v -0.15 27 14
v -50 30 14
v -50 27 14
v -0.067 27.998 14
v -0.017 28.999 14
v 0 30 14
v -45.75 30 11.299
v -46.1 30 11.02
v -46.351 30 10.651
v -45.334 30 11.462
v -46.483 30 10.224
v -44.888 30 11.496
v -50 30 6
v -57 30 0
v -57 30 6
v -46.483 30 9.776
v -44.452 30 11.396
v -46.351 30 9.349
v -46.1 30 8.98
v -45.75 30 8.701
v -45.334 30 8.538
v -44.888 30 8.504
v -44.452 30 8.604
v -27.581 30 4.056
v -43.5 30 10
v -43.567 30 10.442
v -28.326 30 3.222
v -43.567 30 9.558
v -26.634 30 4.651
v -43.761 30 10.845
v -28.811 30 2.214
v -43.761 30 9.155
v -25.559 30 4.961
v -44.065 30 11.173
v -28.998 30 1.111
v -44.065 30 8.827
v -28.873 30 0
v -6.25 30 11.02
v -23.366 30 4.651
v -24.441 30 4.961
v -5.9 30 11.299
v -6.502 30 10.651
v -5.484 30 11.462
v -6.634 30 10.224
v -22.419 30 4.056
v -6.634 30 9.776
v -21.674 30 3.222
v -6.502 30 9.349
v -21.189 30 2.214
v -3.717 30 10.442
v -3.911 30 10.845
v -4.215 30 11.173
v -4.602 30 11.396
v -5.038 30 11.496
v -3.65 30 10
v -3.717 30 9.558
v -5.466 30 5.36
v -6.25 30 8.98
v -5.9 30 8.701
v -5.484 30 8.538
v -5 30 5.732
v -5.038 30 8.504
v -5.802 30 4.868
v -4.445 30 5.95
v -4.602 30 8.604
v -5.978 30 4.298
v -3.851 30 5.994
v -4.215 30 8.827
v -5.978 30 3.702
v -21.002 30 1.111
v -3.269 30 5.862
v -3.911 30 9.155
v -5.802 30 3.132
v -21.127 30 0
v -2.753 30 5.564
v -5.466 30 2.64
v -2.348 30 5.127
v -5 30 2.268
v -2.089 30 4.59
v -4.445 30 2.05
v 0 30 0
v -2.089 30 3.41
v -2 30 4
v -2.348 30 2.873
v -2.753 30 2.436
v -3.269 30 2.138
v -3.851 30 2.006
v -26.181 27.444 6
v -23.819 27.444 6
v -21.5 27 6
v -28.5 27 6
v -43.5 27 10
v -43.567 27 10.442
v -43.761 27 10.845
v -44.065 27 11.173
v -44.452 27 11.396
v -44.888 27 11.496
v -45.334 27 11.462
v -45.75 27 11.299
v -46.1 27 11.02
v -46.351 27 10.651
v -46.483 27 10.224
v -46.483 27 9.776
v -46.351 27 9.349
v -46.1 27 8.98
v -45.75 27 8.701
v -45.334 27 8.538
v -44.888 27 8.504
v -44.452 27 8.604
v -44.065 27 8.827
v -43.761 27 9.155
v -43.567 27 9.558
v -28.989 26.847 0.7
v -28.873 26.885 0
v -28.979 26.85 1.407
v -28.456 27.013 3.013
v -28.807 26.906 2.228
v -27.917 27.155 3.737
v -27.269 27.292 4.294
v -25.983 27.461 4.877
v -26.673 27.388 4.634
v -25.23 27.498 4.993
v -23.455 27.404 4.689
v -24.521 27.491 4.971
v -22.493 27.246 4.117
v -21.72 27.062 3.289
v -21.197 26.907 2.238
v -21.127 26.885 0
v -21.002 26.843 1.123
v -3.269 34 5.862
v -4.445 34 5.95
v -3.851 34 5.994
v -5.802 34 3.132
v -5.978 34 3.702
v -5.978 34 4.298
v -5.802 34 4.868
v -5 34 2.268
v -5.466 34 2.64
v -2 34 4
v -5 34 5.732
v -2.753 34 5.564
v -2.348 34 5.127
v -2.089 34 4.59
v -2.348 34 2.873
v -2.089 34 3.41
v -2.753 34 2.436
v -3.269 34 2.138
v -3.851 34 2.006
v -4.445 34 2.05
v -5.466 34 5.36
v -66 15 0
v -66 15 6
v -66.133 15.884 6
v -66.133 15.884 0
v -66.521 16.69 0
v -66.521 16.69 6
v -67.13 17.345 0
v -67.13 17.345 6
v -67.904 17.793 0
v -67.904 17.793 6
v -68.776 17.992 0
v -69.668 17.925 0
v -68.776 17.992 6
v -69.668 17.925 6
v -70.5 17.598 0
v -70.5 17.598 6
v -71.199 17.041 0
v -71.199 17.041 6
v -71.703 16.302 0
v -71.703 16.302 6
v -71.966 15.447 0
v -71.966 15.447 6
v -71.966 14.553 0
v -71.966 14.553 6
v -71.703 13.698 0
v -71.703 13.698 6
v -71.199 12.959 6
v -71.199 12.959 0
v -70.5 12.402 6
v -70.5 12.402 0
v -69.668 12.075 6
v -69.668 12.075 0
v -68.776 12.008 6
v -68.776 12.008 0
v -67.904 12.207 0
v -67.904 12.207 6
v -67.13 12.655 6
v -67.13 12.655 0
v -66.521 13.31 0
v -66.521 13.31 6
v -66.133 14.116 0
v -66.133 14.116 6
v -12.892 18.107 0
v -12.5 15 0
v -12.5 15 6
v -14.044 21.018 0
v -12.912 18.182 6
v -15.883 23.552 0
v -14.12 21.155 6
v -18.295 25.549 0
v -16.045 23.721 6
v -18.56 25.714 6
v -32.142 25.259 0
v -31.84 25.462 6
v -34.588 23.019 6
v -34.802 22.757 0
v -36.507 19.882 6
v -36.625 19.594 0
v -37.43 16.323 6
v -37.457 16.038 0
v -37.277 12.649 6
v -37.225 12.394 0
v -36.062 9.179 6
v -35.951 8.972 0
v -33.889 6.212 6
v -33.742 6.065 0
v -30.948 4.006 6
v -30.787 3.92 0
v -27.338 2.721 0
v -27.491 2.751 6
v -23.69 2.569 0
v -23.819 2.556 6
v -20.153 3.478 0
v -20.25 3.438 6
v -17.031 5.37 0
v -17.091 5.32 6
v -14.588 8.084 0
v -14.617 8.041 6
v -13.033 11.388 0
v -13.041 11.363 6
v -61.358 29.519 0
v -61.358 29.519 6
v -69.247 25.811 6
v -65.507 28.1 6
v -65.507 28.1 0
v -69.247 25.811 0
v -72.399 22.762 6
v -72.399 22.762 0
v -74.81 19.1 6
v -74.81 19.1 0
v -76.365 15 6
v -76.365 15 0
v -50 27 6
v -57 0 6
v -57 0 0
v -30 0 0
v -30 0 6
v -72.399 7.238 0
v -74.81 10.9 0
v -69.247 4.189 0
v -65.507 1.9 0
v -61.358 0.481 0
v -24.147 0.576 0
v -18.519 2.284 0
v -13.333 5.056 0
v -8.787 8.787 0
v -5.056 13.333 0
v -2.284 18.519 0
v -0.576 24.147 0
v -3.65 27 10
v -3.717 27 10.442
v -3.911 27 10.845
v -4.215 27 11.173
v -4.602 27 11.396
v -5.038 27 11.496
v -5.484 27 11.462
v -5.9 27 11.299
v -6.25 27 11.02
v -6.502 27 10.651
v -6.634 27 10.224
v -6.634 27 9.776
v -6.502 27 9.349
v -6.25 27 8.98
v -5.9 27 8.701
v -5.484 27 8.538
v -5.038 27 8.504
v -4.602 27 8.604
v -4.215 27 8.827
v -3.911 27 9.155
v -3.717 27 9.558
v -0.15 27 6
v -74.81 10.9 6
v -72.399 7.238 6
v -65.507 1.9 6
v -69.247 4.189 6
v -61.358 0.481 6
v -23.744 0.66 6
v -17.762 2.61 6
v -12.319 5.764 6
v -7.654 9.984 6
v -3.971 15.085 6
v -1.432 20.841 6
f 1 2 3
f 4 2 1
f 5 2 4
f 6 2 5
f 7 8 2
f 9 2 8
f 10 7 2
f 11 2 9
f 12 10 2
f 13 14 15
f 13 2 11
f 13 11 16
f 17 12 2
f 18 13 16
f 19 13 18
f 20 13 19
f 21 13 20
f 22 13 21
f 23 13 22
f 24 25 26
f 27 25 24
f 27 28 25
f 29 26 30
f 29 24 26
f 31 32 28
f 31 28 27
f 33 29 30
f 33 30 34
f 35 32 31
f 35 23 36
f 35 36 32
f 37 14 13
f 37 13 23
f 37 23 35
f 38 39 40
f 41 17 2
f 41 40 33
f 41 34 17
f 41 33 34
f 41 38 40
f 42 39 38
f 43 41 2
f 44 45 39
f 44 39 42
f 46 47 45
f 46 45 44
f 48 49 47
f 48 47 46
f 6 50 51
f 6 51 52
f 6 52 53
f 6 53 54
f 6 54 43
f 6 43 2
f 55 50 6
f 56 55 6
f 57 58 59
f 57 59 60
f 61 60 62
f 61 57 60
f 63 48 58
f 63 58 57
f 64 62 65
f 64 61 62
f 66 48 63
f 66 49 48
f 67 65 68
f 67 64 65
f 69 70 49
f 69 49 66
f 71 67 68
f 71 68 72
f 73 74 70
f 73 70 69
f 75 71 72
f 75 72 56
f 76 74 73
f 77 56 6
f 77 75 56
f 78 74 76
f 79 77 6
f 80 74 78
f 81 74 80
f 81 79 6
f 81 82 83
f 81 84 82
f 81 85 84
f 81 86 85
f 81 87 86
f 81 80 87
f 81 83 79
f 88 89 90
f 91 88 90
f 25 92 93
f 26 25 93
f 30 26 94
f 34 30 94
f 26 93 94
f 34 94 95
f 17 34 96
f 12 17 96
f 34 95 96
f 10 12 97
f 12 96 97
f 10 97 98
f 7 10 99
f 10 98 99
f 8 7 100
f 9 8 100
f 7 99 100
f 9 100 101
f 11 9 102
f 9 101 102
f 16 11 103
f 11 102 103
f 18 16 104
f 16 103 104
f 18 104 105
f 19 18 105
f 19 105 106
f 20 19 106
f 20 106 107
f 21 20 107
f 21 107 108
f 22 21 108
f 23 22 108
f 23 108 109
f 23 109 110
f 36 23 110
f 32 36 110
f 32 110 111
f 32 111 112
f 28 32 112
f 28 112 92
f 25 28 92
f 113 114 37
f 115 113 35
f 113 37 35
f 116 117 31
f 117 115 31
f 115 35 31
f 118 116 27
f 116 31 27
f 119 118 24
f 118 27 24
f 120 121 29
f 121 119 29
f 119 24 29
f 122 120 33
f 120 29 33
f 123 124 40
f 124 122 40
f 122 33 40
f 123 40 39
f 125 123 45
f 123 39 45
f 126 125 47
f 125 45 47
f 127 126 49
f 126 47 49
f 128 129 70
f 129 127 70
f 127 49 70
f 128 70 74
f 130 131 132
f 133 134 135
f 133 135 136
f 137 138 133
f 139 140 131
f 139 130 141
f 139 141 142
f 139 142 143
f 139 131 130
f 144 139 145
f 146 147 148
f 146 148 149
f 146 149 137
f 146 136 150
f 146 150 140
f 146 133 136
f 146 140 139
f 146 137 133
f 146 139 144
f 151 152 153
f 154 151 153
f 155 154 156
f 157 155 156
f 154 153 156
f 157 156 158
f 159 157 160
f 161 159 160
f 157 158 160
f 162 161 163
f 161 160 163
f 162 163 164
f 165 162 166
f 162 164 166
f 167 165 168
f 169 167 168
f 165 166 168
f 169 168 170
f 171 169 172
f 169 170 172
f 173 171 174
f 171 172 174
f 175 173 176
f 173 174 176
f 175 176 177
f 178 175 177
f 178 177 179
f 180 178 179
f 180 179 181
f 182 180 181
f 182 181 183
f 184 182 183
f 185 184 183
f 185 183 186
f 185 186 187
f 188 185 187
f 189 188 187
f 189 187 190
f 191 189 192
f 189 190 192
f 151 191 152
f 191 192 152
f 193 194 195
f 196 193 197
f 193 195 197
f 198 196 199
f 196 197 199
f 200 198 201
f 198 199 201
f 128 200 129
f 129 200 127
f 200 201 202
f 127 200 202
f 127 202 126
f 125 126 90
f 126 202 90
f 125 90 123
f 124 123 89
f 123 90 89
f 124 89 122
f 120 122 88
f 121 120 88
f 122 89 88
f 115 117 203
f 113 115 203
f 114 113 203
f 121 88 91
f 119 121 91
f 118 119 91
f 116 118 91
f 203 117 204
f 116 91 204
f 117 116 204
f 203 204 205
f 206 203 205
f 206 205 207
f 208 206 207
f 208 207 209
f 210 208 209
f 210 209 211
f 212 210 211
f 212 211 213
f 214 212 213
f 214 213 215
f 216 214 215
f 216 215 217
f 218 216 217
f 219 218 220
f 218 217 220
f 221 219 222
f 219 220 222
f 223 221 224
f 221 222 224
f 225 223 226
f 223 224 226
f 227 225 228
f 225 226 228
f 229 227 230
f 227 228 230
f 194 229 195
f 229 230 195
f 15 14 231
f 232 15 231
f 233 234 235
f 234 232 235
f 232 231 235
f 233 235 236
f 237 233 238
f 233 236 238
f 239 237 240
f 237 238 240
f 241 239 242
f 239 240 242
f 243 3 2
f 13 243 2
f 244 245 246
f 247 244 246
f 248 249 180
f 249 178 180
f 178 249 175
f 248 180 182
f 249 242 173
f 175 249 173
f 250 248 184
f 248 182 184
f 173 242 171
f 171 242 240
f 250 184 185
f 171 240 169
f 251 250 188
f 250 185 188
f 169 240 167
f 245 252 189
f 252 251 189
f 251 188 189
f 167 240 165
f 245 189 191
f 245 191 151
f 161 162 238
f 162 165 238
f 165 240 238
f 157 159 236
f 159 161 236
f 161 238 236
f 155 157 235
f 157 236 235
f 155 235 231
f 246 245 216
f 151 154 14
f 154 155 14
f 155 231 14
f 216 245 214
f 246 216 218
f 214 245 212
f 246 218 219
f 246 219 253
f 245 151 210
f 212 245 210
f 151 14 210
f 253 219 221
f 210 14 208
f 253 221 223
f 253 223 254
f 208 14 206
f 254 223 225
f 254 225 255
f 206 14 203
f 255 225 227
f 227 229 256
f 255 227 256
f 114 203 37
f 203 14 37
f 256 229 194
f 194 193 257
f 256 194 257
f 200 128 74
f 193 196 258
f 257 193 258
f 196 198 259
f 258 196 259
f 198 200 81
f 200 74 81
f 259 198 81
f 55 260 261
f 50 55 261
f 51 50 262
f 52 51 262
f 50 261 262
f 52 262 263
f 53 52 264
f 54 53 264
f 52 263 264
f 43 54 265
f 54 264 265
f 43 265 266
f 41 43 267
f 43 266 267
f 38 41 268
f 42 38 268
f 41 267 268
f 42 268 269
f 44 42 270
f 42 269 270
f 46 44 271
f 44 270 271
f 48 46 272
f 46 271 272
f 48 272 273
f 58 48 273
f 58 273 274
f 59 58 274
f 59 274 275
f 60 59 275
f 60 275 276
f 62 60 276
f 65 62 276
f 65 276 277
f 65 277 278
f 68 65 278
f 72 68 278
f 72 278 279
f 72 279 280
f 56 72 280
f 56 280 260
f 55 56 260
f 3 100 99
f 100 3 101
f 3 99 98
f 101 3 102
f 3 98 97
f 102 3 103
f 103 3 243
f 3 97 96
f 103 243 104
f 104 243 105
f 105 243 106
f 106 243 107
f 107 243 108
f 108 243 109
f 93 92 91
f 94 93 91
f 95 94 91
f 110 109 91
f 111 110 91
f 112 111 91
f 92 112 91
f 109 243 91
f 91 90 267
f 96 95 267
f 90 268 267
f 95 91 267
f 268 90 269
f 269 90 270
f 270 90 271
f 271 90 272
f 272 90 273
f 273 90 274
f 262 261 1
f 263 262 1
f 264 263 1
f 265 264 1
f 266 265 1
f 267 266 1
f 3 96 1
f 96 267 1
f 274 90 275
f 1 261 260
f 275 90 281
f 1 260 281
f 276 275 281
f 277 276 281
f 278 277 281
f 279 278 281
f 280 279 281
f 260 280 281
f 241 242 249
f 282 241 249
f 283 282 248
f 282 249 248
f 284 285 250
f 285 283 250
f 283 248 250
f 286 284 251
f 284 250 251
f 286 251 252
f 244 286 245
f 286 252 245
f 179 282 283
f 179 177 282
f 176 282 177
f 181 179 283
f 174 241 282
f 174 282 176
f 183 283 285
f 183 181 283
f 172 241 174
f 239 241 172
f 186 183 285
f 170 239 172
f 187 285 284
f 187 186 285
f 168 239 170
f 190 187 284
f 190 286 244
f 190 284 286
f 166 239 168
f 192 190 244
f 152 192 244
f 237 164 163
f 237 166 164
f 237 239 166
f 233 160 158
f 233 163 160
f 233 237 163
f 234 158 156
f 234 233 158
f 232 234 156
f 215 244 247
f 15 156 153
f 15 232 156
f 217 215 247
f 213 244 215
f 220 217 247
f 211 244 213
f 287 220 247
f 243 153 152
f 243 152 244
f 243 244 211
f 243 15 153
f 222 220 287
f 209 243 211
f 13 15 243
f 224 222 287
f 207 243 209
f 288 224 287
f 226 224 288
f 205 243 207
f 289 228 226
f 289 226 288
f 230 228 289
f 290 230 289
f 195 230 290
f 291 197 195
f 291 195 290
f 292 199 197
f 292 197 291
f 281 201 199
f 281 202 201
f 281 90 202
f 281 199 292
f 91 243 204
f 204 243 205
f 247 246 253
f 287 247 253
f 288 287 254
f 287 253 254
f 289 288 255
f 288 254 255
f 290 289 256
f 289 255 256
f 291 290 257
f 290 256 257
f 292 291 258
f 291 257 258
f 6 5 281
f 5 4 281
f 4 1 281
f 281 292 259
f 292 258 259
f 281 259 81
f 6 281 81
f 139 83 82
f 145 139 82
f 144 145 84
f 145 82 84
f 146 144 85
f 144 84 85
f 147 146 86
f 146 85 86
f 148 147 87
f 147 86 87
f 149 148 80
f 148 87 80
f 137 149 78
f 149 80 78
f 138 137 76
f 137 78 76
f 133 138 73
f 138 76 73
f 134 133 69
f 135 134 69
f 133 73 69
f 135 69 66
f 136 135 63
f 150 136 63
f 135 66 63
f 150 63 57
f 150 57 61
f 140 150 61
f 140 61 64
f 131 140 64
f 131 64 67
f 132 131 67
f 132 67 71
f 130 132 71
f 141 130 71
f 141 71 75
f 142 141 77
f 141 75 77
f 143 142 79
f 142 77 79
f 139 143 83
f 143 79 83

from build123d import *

# Parameters (mm, degrees)
ESQUISSE1_W                  = 77
ESQUISSE1_H                  = 30
BOSS_EXTRU_1_DEPTH           = 6
ESQUISSE2_R                  = 12.5
ESQUISSE2_R_2                = 3
ENL_V_MAT_EXTRU_1_DEPTH      = 6
ESQUISSE3_W                  = 50
ESQUISSE3_H                  = 3
BOSS_EXTRU_2_DEPTH           = 8
ENL_V_MAT_EXTRU_2_REACH      = 85.815
ENL_V_MAT_EXTRU_2_END_RADIUS = 12.5
ESQUISSE5_R                  = 4
CONG_1_R                     = 20
CONG_2_R                     = 30
ESQUISSE6_R                  = 2
BOSS_EXTRU_3_DEPTH           = 4
ESQUISSE7_R                  = 1.5
ENL_V_MAT_EXTRU_3_DEPTH      = 10


with BuildPart() as part:
    # Esquisse1 → Boss.-Extru.1 (new body)
    with BuildSketch(Plane.XY):
        with Locations((-38.5, 15)):
            Rectangle(ESQUISSE1_W, ESQUISSE1_H)
    extrude(amount=BOSS_EXTRU_1_DEPTH)

    # Esquisse2 → Enlèv. mat.-Extru.1 (cut)
    with BuildSketch(Plane.XY.offset(6)):
        with Locations((-25, 15)):
            Circle(ESQUISSE2_R)
        with Locations((-69, 15)):
            Circle(ESQUISSE2_R_2)
    extrude(amount=-ENL_V_MAT_EXTRU_1_DEPTH, mode=Mode.SUBTRACT)

    # Esquisse3 → Boss.-Extru.2 (add)
    with BuildSketch(Plane.XY.offset(6)):
        with Locations((-25, 28.5)):
            Rectangle(ESQUISSE3_W, ESQUISSE3_H)
    extrude(amount=BOSS_EXTRU_2_DEPTH)

    # Enlèv. mat.-Extru.2: up to this cylinder (the profile starts outside it)
    enl_v_mat_extru_2_end = Plane(origin=(-25, 15, 1), z_dir=(0, 0, 1)) * Cylinder(ENL_V_MAT_EXTRU_2_END_RADIUS, 197.63, mode=Mode.PRIVATE)
    # Esquisse5 → Enlèv. mat.-Extru.2 (cut, up to the surface)
    with BuildSketch(Plane(origin=(0, 30, 0), x_dir=(1, 0, 0), z_dir=(0, 1, 0)), mode=Mode.PRIVATE) as enl_v_mat_extru_2_sk1:
        with Locations((-25, -1)):
            Circle(ESQUISSE5_R)
    enl_v_mat_extru_2_tool1 = extrude(enl_v_mat_extru_2_sk1.sketch, amount=-ENL_V_MAT_EXTRU_2_REACH, mode=Mode.PRIVATE) - enl_v_mat_extru_2_end
    add(enl_v_mat_extru_2_tool1.solids().sort_by_distance((-25, 30, 1))[0], mode=Mode.SUBTRACT)

    # Congé1
    # the kernel refuses this fillet: 20 mm, written as the material it takes off along each edge
    with BuildSketch(Plane(origin=(-77, 30, -50), x_dir=(1, 0, 0), z_dir=(0, 0, 1))) as cong_1_piece_1:
        with BuildLine():
            CenterArc((CONG_1_R, -CONG_1_R), CONG_1_R, 90, 90)
            Line((0, -CONG_1_R), (0, 0))
            Line((0, 0), (CONG_1_R, 0))
        make_face()
    extrude(amount=106, mode=Mode.SUBTRACT)
    with BuildSketch(Plane(origin=(-77, 0, -50), x_dir=(1, 0, 0), z_dir=(0, 0, 1))) as cong_1_piece_2:
        with BuildLine():
            CenterArc((CONG_1_R, CONG_1_R), CONG_1_R, 180, 90)
            Line((0, CONG_1_R), (0, 0))
            Line((0, 0), (CONG_1_R, 0))
        make_face()
    extrude(amount=106, mode=Mode.SUBTRACT)

    # Congé2
    # the kernel refuses this fillet: 30 mm, written as the material it takes off along each edge
    with BuildSketch(Plane(origin=(0, 0, -75), x_dir=(-1, 0, 0), z_dir=(0, 0, 1))) as cong_2_piece_1:
        with BuildLine():
            CenterArc((CONG_2_R, -CONG_2_R), CONG_2_R, 90, 90)
            Line((0, -CONG_2_R), (0, 0))
            Line((0, 0), (CONG_2_R, 0))
        make_face()
    extrude(amount=156, mode=Mode.SUBTRACT)

    # Esquisse6 → Boss.-Extru.3 (add)
    with BuildSketch(Plane(origin=(0, 30, 0), x_dir=(1, 0, 0), z_dir=(0, 1, 0))):
        with Locations((-4, -4)):
            Circle(ESQUISSE6_R)
    extrude(amount=BOSS_EXTRU_3_DEPTH)

    # Esquisse7 → Enlèv. mat.-Extru.3 (cut)
    with BuildSketch(Plane.XZ.offset(-27)):
        with Locations((-45, 10)):
            Circle(ESQUISSE7_R)
        with Locations((-5.150376887, 10)):
            Circle(ESQUISSE7_R)
    extrude(amount=-ENL_V_MAT_EXTRU_3_DEPTH, mode=Mode.SUBTRACT)


solid = part.part
